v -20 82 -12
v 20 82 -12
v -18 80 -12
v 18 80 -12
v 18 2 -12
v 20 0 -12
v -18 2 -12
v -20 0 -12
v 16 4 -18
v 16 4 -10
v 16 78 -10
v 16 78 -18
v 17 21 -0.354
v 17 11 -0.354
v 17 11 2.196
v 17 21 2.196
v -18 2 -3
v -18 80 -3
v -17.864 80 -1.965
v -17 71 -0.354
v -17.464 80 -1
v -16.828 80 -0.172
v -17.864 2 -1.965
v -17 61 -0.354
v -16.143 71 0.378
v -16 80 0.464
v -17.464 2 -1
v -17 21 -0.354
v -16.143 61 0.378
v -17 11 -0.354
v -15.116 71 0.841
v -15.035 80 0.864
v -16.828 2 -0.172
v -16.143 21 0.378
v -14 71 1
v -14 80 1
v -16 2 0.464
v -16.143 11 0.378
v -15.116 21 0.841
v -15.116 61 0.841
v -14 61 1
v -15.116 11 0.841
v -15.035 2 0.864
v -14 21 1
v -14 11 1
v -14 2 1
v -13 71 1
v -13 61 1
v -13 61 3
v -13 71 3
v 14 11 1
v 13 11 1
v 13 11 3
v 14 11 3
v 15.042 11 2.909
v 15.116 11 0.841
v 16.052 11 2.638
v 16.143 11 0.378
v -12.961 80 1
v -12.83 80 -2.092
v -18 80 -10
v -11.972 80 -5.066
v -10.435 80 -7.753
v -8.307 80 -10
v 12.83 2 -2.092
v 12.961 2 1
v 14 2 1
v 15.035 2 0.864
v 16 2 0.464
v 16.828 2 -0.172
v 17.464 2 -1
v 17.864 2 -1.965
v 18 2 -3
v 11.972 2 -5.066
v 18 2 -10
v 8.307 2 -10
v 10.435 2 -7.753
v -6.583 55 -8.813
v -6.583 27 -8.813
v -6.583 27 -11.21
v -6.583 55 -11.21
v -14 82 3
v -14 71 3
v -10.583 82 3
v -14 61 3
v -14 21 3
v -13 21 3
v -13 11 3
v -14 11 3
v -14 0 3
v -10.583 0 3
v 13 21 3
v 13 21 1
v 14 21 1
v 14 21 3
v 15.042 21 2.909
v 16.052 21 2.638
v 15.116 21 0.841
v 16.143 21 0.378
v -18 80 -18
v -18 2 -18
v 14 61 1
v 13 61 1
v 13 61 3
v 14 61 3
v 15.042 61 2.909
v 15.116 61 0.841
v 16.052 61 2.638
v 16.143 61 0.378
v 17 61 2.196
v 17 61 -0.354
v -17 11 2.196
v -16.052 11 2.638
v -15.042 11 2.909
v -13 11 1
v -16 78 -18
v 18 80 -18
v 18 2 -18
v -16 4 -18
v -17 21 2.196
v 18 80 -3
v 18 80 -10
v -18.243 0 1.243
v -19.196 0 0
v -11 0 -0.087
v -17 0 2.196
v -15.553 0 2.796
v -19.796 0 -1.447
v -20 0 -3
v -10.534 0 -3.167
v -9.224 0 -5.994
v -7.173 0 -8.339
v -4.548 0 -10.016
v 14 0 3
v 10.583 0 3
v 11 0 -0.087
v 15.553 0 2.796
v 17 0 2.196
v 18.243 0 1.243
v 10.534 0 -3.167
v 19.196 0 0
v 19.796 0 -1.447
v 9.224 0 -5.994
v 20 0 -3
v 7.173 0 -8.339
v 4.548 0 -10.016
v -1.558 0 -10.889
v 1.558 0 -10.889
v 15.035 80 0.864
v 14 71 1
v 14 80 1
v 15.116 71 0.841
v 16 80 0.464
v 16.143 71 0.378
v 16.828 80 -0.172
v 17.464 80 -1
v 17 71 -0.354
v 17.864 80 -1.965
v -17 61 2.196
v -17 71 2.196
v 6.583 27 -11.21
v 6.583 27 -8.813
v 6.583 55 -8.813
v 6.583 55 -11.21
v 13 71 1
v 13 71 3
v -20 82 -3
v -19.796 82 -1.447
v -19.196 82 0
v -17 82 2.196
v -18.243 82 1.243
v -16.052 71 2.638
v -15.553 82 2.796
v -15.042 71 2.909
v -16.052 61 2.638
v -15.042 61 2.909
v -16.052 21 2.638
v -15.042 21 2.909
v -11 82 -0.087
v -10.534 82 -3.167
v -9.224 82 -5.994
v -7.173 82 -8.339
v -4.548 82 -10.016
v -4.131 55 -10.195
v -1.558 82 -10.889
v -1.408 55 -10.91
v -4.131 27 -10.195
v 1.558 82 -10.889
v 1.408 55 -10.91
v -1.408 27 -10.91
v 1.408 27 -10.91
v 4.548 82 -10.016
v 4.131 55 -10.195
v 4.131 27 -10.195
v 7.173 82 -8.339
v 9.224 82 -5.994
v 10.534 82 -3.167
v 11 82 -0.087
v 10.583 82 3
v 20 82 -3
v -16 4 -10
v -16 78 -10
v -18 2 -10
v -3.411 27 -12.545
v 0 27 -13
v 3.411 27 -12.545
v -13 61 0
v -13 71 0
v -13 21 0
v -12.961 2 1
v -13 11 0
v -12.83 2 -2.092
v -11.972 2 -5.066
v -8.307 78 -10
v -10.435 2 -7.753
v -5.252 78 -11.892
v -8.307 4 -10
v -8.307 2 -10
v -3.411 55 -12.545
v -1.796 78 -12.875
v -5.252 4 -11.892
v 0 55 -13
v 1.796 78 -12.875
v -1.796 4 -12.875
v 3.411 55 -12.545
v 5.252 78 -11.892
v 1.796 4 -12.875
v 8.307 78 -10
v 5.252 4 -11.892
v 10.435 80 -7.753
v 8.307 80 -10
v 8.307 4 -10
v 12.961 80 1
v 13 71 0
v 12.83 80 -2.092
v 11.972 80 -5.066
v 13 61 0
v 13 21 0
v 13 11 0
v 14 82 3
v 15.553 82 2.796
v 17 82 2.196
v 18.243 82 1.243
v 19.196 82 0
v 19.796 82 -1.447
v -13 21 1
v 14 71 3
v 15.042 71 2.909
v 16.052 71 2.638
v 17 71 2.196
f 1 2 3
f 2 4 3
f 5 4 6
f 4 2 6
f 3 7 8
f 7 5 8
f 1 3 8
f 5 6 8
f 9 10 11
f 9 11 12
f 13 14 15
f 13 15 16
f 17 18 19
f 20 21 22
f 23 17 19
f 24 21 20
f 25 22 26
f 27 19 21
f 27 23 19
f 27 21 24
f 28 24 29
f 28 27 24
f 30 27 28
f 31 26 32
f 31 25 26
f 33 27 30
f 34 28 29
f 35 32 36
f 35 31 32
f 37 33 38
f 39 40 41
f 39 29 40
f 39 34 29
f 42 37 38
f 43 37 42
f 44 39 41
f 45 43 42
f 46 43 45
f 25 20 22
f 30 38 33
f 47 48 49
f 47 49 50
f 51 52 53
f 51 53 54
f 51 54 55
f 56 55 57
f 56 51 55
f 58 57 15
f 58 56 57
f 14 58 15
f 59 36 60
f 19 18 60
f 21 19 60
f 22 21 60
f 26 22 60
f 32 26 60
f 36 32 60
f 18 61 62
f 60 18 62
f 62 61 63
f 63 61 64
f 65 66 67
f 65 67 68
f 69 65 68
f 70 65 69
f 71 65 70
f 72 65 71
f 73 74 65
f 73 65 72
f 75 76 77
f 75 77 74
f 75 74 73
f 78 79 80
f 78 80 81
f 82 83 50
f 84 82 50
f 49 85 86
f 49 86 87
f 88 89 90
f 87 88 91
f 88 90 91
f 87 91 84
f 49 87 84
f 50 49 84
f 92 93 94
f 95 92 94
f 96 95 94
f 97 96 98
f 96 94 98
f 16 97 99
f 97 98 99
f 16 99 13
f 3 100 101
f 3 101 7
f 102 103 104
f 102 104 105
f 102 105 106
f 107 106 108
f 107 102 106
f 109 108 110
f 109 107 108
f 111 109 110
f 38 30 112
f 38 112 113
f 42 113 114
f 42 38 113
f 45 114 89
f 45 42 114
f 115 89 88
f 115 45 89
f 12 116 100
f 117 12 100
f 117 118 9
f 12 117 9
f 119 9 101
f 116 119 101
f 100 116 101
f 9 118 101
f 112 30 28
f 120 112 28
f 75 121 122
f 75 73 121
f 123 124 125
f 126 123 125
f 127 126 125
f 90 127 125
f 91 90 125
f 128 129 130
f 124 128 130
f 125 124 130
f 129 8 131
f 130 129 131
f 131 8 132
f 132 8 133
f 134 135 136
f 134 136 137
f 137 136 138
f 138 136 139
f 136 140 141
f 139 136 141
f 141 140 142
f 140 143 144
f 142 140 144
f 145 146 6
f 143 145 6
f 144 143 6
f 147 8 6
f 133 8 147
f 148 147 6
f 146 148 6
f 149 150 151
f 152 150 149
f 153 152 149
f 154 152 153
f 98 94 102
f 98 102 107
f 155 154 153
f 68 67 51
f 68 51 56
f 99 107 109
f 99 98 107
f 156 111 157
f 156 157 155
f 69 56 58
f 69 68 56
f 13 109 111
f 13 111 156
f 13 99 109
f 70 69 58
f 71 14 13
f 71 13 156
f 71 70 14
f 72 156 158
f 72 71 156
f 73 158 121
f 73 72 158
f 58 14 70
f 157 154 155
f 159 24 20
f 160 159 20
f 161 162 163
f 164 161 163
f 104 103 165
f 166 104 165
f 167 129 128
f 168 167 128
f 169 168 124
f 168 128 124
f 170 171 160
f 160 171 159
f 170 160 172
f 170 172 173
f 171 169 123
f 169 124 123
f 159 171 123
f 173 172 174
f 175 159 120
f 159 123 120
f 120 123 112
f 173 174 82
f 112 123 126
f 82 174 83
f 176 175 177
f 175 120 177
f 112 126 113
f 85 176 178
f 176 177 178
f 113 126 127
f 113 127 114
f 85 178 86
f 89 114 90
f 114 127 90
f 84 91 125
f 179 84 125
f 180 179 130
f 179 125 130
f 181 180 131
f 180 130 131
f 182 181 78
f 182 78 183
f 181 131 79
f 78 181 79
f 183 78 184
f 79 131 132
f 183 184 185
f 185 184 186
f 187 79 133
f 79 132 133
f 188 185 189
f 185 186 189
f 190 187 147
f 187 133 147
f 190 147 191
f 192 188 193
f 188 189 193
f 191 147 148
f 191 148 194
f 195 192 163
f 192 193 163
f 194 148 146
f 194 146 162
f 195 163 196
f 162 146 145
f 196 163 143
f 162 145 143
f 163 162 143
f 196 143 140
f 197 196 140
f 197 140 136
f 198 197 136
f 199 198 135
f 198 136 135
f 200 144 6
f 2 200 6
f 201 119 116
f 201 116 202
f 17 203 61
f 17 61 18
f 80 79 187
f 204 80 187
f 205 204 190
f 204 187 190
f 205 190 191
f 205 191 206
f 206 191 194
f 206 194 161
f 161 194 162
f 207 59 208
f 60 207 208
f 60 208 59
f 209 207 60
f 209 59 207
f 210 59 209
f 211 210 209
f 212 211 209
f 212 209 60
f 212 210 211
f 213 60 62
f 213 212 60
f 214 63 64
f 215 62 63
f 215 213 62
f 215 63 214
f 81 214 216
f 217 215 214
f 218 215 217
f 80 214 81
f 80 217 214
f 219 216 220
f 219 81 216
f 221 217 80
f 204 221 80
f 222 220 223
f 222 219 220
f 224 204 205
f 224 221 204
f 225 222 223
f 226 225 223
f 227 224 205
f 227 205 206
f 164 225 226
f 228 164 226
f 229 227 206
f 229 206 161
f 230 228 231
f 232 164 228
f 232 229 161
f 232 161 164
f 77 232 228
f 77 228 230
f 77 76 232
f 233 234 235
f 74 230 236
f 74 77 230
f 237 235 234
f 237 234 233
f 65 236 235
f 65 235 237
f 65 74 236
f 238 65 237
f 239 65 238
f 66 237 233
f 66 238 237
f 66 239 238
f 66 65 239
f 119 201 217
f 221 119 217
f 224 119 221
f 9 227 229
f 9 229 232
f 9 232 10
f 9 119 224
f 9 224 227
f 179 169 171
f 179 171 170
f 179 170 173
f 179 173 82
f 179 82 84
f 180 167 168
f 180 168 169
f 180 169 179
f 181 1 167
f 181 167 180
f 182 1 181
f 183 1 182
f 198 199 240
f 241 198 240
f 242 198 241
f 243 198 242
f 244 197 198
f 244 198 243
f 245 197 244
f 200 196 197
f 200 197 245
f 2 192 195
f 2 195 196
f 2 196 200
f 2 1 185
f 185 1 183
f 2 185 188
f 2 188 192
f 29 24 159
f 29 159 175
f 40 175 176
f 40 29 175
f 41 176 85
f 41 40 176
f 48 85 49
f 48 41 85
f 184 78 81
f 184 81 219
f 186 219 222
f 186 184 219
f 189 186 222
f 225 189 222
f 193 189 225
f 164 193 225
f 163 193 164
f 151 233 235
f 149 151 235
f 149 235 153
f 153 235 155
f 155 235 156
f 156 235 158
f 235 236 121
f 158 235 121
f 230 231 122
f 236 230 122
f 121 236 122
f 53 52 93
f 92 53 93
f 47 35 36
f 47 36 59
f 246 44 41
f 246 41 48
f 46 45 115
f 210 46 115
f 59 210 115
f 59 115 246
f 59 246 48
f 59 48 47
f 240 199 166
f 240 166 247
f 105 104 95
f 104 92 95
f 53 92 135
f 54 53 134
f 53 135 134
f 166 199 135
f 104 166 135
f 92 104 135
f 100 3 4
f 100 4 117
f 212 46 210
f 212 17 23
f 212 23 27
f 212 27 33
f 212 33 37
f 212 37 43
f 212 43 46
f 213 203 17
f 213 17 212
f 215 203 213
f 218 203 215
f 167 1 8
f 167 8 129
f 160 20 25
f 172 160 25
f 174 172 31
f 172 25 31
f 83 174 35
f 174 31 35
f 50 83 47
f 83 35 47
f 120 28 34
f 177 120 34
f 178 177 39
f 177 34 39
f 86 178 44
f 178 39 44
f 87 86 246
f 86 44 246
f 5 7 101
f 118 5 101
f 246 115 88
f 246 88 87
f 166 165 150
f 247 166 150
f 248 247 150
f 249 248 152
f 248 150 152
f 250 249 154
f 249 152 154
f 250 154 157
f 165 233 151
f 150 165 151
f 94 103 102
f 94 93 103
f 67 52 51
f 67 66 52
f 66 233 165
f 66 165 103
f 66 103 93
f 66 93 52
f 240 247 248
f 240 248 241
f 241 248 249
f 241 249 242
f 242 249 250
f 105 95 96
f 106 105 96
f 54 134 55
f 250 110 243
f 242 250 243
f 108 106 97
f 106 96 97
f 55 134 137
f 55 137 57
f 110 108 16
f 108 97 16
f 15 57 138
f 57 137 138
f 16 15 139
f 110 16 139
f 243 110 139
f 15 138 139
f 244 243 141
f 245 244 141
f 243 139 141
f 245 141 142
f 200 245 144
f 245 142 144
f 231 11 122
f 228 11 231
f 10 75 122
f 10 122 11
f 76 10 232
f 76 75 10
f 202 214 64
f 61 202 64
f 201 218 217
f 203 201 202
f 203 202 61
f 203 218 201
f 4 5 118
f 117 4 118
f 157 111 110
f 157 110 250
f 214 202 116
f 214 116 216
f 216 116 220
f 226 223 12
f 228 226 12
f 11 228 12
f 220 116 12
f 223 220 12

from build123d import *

# Parameters (mm, degrees)
BOSS_EXTRUDE1_DEPTH     = 82
CUT_EXTRUDE1_DEPTH      = 30
CUT_EXTRUDE1_DEPTH_BACK = 30
SKETCH2_W               = 6
SKETCH2_H               = 2
SHELL1_START            = 4
SHELL1_DEPTH            = 74
SHELL1_START_2          = 2
SHELL1_2_DEPTH          = 78
CUT_EXTRUDE2_DEPTH      = 6
CUT_EXTRUDE2_DEPTH_BACK = 6
SKETCH3_W               = 4
SKETCH3_H               = 10
SKETCH4_W               = 13.166010488
SKETCH4_H               = 28
CUT_EXTRUDE3_DEPTH      = 20


# Read off the part's stored shape, not the designer's step: Shell1
with BuildPart() as part:
    # Sketch1 → Boss-Extrude1 (new body)
    with BuildSketch(Plane(origin=(0, 0, 0), x_dir=(1, 0, 0), z_dir=(0, 1, 0))):
        with BuildLine():
            Line((-20, 12), (-20, 3))
            ThreePointArc((-20, 3), (-18.242640687, -1.242640687), (-14, -3))
            Line((-14, -3), (-10.583005244, -3))
            ThreePointArc((-10.583005244, -3), (0, 11), (10.583005244, -3))
            Line((10.583005244, -3), (14, -3))
            ThreePointArc((14, -3), (18.242640687, -1.242640687), (20, 3))
            Line((20, 3), (20, 12))
            Line((20, 12), (18, 12))
            Line((18, 12), (18, 18))
            Line((18, 18), (-18, 18))
            Line((-18, 18), (-18, 12))
            Line((-18, 12), (-20, 12))
        make_face()
    extrude(amount=BOSS_EXTRUDE1_DEPTH)

    # Sketch2 → Cut-Extrude1 (cut, two sides: drawn at the far end of the back side and taken through both)
    with BuildSketch(Plane(origin=(0, 0, 0), x_dir=(0, 0, -1), z_dir=(1, 0, 0)).offset(-CUT_EXTRUDE1_DEPTH_BACK)):
        with Locations((15, 81)):
            Rectangle(SKETCH2_W, SKETCH2_H)
        with Locations((15, 1)):
            Rectangle(SKETCH2_W, SKETCH2_H)
    extrude(amount=CUT_EXTRUDE1_DEPTH + CUT_EXTRUDE1_DEPTH_BACK, mode=Mode.SUBTRACT)

    # Shell1 outline → Shell1 (cut)
    with BuildSketch(Plane(origin=(0, 0, 0), x_dir=(1, 0, 0), z_dir=(0, 1, 0)).offset(SHELL1_START)):
        with BuildLine():
            Line((-14, -1), (-12.961481397, -1))
            ThreePointArc((-12.961481397, -1), (0, 13), (12.961481397, -1))
            Line((12.961481397, -1), (14, -1))
            ThreePointArc((14, -1), (16.828427125, 0.171572875), (18, 3))
            Line((18, 3), (18, 10))
            Line((18, 10), (16, 10))
            Line((16, 10), (16, 18))
            Line((16, 18), (-16, 18))
            Line((-16, 18), (-16, 10))
            Line((-16, 10), (-18, 10))
            Line((-18, 10), (-18, 3))
            ThreePointArc((-18, 3), (-16.828427125, 0.171572875), (-14, -1))
        make_face()
    extrude(amount=SHELL1_DEPTH, mode=Mode.SUBTRACT)

    # Shell1 2 outline → Shell1 2 (cut)
    with BuildSketch(Plane(origin=(0, 0, 0), x_dir=(1, 0, 0), z_dir=(0, 1, 0)).offset(SHELL1_START_2)):
        with BuildLine():
            Line((-14, -1), (-12.961481397, -1))
            ThreePointArc((-12.961481397, -1), (-11.972179223, 5.066253514), (-8.306623863, 10))
            Line((-8.306623863, 10), (-18, 10))
            Line((-18, 10), (-18, 3))
            ThreePointArc((-18, 3), (-16.828427125, 0.171572875), (-14, -1))
        make_face()
        with BuildLine():
            Line((18, 10), (8.306623863, 10))
            ThreePointArc((8.306623863, 10), (11.972179223, 5.066253514), (12.961481397, -1))
            Line((12.961481397, -1), (14, -1))
            ThreePointArc((14, -1), (16.828427125, 0.171572875), (18, 3))
            Line((18, 3), (18, 10))
        make_face()
    extrude(amount=SHELL1_2_DEPTH, mode=Mode.SUBTRACT)

    # Sketch3 → Cut-Extrude2 (cut, two sides: drawn at the far end of the back side and taken through both)
    with BuildSketch(Plane.XY.offset(-CUT_EXTRUDE2_DEPTH_BACK)):
        with Locations((-15, 16)):
            Rectangle(SKETCH3_W, SKETCH3_H)
        with Locations((15, 16)):
            Rectangle(SKETCH3_W, SKETCH3_H)
        with Locations((15, 66)):
            Rectangle(SKETCH3_W, SKETCH3_H)
        with Locations((-15, 66)):
            Rectangle(SKETCH3_W, SKETCH3_H)
    extrude(amount=CUT_EXTRUDE2_DEPTH + CUT_EXTRUDE2_DEPTH_BACK, mode=Mode.SUBTRACT)

    # Sketch4 → Cut-Extrude3 (cut)
    with BuildSketch(Plane.XY):
        with Locations((0, 41)):
            Rectangle(SKETCH4_W, SKETCH4_H)
    extrude(amount=-CUT_EXTRUDE3_DEPTH, mode=Mode.SUBTRACT)


solid = part.part
